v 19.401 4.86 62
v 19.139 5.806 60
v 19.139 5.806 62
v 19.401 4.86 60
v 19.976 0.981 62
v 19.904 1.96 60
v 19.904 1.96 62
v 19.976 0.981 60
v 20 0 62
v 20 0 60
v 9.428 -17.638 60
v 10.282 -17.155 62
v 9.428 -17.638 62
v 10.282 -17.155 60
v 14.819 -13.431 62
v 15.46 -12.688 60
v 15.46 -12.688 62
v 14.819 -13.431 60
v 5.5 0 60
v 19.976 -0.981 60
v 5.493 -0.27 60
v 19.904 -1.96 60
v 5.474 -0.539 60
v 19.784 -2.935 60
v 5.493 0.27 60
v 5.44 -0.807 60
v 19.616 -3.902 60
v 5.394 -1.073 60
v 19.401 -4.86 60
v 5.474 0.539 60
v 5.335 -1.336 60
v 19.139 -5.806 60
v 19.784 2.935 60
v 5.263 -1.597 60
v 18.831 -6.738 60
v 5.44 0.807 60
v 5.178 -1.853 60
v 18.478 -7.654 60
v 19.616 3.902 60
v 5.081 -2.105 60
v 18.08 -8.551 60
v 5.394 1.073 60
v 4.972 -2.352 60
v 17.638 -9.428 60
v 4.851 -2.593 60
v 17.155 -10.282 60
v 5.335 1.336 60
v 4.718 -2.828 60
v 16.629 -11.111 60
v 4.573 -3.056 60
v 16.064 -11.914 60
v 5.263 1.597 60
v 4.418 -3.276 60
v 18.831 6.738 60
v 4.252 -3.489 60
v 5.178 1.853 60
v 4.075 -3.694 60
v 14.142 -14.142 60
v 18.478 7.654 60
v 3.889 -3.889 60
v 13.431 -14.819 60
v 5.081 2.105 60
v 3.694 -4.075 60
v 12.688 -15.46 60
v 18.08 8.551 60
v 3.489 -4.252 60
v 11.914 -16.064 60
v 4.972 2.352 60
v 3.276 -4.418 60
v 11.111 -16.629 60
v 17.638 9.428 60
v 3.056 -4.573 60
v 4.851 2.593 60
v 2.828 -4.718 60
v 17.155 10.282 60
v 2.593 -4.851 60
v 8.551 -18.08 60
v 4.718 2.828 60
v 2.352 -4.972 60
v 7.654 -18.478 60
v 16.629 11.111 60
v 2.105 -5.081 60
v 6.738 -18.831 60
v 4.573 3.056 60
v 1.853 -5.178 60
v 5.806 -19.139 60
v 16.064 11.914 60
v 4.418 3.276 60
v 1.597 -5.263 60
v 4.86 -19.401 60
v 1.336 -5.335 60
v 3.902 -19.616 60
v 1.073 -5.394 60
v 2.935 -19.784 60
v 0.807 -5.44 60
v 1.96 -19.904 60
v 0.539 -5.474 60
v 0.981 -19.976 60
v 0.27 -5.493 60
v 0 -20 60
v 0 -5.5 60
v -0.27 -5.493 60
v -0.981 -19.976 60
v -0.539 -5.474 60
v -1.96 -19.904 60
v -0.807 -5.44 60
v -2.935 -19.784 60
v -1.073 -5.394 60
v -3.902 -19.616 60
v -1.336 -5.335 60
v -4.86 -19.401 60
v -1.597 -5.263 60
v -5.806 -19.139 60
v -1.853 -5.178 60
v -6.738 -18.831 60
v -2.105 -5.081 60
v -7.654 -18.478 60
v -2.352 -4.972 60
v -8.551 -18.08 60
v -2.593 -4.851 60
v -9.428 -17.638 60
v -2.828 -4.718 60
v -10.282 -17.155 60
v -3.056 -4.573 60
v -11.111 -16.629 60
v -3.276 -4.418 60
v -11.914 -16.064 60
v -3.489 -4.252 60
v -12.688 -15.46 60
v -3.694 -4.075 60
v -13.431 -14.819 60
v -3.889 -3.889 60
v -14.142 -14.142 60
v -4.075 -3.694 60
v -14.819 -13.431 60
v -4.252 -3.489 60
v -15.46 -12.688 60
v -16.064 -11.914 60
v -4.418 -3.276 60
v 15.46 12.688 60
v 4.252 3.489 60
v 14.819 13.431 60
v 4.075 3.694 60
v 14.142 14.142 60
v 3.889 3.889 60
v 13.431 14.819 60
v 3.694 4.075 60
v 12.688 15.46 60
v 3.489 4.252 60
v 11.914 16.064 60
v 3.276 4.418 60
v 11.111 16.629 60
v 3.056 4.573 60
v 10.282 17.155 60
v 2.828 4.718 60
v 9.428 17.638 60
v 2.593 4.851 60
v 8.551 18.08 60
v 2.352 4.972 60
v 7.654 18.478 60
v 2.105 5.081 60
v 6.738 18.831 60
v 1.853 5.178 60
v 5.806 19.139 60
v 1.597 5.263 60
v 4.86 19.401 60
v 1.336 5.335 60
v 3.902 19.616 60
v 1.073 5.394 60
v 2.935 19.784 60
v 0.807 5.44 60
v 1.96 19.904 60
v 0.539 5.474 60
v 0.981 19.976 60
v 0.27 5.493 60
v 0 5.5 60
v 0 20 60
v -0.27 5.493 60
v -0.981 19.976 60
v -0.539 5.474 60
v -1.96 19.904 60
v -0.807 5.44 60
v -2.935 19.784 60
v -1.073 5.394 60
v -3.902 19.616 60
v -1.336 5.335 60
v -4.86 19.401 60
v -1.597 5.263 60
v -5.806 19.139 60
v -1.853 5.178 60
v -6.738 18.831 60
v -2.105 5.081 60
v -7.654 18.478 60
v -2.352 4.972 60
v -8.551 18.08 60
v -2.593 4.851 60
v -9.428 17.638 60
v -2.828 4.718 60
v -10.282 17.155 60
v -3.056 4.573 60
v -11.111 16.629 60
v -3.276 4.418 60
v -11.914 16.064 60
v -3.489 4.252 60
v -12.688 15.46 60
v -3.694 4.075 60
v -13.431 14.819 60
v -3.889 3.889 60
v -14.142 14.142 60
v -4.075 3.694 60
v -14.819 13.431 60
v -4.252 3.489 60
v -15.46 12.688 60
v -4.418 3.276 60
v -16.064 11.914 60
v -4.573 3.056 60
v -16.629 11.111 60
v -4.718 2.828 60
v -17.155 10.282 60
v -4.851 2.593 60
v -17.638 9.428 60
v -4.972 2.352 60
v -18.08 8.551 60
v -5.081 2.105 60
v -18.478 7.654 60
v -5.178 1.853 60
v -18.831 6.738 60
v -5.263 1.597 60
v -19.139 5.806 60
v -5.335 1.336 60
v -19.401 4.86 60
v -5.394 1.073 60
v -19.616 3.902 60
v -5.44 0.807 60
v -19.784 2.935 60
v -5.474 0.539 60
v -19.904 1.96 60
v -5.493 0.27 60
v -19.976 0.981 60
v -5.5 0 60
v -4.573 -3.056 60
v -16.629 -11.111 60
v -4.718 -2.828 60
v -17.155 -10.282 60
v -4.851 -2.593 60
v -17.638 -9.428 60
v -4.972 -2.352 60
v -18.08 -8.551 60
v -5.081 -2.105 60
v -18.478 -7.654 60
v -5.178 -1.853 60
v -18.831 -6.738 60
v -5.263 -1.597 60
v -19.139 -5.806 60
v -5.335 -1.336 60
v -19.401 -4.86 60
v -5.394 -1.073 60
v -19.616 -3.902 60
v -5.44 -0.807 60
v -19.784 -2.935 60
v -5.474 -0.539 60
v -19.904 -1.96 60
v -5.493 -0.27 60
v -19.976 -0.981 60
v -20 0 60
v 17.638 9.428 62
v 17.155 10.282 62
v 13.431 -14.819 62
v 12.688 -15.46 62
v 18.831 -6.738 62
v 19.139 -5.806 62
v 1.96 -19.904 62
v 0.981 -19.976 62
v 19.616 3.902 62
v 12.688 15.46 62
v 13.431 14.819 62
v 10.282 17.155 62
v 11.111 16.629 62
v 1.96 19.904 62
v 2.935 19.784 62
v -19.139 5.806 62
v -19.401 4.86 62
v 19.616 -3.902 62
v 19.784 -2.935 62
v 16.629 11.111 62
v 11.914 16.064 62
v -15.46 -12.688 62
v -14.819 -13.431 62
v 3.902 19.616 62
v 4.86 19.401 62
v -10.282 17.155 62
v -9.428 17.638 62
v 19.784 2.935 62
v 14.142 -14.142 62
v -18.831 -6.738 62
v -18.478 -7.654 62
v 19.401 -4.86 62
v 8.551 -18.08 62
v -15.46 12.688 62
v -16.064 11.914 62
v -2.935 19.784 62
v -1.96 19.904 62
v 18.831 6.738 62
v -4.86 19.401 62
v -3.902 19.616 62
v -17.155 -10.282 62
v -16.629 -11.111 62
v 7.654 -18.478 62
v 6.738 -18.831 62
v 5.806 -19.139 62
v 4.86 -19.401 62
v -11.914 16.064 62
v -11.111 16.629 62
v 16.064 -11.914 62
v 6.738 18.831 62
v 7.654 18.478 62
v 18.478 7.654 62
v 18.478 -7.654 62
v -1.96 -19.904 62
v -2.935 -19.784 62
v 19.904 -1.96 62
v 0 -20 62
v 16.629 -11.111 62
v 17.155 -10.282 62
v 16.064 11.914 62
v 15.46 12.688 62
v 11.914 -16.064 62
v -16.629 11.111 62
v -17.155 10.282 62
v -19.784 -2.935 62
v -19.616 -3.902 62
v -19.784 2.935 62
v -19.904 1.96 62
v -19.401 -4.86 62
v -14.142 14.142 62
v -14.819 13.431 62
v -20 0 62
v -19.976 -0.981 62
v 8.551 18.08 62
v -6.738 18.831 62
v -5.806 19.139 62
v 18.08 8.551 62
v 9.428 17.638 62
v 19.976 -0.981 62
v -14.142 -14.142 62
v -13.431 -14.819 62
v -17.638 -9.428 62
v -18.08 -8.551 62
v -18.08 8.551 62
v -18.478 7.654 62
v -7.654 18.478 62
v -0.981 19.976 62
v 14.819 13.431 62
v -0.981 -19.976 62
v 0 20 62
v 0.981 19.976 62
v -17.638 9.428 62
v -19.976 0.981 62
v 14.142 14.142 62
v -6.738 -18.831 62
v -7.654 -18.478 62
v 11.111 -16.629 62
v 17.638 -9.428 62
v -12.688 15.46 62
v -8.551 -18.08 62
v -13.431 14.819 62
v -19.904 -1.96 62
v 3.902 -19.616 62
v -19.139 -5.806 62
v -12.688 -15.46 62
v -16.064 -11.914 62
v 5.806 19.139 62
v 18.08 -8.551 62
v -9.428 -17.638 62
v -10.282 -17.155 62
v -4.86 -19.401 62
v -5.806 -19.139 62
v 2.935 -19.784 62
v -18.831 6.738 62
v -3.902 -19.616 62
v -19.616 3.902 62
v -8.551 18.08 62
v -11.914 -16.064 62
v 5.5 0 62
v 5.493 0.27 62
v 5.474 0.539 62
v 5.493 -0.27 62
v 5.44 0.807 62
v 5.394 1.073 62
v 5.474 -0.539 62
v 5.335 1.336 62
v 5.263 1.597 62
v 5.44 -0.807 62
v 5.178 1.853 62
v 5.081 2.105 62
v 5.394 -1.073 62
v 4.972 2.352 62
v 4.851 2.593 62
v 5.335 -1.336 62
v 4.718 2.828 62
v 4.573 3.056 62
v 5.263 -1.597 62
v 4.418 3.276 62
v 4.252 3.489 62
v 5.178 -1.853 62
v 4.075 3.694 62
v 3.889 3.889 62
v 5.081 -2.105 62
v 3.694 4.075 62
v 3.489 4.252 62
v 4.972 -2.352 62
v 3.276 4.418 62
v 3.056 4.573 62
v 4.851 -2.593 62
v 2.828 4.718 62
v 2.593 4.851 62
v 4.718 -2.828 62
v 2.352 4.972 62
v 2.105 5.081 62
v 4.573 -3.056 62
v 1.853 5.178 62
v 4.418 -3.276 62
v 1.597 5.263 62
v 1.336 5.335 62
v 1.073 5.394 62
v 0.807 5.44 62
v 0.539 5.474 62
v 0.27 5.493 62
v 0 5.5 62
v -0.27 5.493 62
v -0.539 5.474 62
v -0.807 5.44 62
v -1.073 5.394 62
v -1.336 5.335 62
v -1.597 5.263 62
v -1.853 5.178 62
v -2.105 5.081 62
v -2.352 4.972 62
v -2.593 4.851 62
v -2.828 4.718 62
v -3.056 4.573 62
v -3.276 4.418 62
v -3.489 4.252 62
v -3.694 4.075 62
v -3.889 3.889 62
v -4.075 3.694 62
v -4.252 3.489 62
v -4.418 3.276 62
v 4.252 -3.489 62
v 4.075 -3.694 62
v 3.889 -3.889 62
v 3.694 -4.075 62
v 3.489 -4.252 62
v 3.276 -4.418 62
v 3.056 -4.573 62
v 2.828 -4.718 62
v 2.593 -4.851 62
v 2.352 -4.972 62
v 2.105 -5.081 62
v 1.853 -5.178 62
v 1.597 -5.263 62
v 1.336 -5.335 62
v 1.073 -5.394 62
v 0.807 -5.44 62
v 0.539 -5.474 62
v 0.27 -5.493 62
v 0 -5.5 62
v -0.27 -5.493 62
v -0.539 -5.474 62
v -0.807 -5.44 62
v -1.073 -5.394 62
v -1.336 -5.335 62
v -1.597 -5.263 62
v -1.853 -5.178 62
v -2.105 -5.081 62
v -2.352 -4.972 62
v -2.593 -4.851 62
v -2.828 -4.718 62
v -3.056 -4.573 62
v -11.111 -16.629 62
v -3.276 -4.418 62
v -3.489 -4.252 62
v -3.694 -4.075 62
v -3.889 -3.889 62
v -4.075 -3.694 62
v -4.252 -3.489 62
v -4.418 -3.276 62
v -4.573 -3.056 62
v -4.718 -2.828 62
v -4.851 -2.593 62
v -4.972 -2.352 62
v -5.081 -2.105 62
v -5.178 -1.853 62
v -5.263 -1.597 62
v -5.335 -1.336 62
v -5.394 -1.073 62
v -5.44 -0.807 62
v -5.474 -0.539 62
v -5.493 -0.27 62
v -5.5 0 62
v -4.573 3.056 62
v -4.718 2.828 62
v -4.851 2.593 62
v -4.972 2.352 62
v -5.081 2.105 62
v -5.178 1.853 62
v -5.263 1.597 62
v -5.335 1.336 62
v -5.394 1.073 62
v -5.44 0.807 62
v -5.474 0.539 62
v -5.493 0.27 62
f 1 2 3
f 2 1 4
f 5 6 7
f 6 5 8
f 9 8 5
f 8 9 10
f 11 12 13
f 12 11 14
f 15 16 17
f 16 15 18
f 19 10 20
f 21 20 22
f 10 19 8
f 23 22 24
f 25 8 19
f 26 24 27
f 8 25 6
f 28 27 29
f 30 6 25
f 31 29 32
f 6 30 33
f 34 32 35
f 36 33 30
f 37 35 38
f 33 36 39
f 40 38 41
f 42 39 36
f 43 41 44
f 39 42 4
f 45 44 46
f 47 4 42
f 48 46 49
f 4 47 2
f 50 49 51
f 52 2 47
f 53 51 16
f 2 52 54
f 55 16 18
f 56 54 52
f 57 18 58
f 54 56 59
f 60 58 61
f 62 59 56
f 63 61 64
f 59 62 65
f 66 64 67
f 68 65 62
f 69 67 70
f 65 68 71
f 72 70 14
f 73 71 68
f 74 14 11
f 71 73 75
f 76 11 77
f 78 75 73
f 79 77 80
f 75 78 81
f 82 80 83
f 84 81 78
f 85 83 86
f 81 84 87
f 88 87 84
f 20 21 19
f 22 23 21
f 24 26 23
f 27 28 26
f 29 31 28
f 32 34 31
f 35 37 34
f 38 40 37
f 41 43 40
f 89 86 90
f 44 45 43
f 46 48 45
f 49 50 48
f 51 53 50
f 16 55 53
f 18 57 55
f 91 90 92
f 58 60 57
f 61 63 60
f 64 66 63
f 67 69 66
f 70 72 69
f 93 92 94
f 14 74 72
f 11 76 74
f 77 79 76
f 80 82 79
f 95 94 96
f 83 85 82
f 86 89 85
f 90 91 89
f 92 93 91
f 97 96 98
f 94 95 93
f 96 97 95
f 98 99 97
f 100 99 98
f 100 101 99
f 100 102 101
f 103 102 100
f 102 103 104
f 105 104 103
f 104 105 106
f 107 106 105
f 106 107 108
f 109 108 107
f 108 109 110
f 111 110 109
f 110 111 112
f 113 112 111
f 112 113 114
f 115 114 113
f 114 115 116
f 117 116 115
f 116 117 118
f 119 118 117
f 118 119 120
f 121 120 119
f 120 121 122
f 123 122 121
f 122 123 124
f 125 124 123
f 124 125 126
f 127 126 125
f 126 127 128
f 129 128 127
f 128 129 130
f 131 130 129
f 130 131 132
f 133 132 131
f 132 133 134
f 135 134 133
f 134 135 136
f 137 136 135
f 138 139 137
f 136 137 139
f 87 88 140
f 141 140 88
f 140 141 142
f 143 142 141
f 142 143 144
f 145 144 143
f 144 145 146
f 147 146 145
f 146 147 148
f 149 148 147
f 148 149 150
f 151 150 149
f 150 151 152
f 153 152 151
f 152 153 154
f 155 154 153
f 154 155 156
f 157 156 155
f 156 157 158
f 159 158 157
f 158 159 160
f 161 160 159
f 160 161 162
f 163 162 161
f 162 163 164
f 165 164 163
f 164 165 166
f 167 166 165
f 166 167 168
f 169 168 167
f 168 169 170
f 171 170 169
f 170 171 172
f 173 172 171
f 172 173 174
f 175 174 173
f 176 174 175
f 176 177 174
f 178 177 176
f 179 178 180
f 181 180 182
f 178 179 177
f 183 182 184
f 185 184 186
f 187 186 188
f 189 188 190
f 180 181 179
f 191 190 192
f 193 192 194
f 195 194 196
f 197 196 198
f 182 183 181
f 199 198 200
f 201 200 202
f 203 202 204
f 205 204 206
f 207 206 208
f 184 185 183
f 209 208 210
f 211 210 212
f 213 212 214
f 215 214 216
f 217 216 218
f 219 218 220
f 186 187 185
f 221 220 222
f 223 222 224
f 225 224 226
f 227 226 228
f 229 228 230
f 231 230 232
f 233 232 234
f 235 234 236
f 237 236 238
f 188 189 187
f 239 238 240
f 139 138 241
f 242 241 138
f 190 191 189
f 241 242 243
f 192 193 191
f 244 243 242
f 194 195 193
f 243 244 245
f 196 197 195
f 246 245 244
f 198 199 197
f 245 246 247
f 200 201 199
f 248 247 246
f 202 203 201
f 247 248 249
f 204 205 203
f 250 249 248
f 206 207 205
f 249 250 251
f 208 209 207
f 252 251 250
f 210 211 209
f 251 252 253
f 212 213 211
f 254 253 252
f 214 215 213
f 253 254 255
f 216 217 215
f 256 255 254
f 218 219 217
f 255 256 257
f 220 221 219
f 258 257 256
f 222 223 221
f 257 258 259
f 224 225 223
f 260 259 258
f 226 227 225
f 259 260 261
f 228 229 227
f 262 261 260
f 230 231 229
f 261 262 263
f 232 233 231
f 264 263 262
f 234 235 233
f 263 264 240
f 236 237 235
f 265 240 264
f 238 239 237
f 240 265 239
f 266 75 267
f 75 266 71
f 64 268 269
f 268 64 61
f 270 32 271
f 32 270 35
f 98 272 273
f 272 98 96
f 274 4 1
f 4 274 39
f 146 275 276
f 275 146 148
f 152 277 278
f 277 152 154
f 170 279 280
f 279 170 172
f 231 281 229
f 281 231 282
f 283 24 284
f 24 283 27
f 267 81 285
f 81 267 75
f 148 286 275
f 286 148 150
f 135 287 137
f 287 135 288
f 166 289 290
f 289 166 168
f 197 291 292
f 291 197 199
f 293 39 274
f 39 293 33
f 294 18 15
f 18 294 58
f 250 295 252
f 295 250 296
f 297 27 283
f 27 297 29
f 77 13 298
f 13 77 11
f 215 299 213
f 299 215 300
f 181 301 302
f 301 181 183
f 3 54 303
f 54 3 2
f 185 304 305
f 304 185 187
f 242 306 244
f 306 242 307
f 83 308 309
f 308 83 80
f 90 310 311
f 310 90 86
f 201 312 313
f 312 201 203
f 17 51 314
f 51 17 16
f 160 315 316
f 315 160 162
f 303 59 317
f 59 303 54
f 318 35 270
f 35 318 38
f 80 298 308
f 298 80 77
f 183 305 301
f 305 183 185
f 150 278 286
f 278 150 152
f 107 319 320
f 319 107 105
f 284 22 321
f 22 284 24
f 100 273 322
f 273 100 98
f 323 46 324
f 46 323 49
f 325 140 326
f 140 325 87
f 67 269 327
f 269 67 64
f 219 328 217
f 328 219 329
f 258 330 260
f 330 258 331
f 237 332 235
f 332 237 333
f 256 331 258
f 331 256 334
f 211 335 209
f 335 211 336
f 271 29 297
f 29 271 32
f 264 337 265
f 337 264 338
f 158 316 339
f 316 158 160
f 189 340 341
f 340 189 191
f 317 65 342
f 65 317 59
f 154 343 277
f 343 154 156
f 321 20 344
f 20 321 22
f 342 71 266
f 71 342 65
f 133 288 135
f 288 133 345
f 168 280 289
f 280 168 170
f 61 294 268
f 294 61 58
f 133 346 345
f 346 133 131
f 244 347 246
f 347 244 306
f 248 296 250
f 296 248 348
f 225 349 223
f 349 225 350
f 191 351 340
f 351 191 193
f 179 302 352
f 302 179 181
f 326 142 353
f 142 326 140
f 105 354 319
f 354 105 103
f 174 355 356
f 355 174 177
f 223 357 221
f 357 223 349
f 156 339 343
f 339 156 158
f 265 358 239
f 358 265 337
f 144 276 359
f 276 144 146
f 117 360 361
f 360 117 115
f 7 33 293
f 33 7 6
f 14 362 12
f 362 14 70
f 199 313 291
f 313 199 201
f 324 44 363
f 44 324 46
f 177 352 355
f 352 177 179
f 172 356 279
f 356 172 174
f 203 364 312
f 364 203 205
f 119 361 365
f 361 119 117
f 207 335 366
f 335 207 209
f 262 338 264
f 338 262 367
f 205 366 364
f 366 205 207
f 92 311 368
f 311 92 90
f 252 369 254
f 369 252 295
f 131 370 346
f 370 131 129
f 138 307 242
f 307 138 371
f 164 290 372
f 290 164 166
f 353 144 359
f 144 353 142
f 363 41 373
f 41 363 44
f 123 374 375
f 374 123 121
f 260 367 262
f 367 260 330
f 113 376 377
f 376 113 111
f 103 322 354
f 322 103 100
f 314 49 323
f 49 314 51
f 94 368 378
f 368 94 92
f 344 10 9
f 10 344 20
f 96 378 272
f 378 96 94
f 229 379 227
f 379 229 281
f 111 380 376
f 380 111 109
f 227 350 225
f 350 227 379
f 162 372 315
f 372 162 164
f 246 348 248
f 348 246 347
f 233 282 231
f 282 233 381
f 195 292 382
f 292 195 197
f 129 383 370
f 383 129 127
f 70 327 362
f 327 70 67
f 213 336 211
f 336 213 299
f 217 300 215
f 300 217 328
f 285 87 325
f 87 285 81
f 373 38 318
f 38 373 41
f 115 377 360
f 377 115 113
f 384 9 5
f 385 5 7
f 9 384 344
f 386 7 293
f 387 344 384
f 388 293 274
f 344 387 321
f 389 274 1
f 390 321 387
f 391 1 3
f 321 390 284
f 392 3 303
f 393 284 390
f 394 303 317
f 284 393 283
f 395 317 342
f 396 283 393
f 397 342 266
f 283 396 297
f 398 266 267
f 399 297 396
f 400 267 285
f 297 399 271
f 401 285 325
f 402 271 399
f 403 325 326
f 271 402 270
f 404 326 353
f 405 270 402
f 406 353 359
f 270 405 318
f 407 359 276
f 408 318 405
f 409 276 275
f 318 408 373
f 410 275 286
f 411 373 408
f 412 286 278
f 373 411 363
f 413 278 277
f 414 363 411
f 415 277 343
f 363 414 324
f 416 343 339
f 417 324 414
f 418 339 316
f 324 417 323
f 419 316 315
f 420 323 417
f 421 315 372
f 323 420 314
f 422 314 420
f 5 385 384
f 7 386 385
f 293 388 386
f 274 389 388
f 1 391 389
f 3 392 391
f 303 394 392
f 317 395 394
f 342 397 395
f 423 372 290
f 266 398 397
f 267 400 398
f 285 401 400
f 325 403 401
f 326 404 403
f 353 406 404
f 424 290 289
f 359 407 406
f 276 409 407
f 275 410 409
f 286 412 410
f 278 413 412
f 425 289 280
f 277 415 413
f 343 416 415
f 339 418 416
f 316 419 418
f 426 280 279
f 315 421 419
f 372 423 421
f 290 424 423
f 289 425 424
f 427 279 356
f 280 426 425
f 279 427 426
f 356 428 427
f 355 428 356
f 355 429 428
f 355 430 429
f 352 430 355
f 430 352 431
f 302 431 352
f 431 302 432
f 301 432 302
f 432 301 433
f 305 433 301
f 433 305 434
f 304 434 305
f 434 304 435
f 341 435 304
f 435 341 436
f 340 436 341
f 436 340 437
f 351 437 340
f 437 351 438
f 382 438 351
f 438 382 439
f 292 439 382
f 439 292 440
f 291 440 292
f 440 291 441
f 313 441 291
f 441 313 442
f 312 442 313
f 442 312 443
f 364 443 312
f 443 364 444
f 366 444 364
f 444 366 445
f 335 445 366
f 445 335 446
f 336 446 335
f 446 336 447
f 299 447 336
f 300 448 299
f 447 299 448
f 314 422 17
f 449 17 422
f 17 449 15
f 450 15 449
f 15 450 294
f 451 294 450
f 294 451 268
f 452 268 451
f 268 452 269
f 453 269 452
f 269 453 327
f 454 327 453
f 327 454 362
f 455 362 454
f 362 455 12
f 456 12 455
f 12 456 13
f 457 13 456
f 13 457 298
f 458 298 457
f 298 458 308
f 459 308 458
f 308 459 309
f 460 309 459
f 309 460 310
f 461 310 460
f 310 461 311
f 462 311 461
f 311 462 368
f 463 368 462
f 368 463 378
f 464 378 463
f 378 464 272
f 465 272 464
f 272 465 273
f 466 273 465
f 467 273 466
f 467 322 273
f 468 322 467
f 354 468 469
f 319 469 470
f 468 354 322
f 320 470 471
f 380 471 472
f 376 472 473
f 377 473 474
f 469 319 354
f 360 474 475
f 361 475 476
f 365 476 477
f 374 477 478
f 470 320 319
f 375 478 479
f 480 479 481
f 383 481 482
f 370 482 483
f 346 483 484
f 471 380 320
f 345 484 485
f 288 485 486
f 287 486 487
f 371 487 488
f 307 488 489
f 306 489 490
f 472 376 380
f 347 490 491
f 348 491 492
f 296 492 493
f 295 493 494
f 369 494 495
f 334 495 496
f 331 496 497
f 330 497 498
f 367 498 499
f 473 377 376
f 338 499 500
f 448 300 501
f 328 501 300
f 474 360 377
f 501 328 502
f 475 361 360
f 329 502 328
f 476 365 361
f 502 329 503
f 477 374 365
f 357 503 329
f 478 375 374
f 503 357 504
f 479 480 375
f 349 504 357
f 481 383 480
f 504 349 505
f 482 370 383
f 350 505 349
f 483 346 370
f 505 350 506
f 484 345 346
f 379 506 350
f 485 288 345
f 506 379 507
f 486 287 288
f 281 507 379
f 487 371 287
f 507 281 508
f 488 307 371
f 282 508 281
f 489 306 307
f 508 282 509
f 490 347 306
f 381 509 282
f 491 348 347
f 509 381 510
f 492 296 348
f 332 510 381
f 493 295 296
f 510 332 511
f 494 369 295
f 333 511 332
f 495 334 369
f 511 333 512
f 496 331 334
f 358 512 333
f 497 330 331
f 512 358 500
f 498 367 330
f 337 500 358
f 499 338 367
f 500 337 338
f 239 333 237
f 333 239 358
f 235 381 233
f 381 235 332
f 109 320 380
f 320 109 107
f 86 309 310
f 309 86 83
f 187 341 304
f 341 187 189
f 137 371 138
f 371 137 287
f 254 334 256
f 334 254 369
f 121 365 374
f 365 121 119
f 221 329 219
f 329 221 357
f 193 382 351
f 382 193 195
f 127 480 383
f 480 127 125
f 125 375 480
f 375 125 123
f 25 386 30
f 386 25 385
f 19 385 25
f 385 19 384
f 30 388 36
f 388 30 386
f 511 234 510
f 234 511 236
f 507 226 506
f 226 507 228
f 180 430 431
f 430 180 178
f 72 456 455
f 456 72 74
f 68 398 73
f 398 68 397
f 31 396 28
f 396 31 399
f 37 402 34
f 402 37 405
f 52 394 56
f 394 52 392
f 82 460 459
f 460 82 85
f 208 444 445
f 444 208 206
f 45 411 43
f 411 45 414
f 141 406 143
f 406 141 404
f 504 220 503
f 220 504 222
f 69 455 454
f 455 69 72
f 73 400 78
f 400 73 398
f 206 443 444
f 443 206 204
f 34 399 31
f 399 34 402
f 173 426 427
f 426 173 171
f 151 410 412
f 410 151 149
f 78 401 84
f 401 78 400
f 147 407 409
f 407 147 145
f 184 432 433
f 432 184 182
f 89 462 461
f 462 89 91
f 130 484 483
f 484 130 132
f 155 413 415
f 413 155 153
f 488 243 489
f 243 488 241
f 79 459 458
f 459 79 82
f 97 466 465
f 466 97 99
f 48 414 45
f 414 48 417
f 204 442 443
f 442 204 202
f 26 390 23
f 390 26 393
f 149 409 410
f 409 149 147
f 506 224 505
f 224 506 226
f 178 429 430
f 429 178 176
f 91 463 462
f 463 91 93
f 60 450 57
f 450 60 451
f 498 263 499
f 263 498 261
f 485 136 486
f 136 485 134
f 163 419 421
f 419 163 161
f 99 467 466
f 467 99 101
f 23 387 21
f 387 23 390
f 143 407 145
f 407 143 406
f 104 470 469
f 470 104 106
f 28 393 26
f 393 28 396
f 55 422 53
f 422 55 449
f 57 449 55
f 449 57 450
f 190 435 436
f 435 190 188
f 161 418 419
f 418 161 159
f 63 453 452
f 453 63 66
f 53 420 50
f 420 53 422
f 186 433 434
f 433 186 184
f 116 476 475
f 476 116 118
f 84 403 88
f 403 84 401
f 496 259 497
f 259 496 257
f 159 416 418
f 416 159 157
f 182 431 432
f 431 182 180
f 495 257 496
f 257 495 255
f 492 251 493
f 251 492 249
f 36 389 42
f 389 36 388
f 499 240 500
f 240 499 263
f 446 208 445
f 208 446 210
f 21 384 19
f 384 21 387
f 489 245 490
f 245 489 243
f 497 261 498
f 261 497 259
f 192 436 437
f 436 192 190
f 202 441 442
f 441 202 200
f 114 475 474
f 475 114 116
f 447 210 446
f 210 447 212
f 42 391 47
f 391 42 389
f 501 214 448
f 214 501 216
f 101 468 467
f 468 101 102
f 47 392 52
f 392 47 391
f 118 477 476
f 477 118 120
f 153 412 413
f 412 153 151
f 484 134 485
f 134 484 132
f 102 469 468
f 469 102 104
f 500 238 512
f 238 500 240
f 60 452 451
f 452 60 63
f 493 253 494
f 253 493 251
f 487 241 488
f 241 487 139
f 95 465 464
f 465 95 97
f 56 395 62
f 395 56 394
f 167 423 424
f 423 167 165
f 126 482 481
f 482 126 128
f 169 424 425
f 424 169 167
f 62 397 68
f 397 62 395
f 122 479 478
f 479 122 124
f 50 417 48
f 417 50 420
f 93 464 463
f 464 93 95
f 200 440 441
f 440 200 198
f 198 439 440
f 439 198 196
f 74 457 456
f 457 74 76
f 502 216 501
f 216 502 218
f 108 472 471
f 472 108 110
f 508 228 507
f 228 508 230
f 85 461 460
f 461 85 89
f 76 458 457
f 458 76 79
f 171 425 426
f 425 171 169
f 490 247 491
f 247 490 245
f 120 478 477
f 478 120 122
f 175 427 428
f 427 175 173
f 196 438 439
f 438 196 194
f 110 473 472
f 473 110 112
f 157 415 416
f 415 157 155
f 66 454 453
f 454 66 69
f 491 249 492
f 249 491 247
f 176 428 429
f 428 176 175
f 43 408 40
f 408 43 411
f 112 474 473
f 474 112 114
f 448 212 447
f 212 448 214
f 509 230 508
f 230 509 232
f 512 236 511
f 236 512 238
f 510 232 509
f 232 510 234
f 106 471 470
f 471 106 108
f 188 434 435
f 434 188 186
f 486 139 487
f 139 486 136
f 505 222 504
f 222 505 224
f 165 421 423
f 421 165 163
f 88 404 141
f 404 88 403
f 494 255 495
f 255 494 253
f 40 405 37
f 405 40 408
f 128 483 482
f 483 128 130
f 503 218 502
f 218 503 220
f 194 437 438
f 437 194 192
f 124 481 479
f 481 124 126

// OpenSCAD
// file: common_params.scad
cylinder_radius = 20.000000;
cylinder_height = 60.000000;
wall_thickness = 2.000000;

cap_thickness = 2.000000;

rod_radius = 2.000000;
rod_height = 50.000000;

ring_outer_radius = 8.000000;
ring_inner_radius = 4.000000;
ring_thickness = 3.000000;
ring_z = 40.000000;

$fn = 128;
// main file
include <common_params.scad>;

hole_radius = 5.500000;

translate([0, 0, cylinder_height])
difference() {
    cylinder(h = cap_thickness, r = cylinder_radius);
    translate([0, 0, -0.1])
        cylinder(h = cap_thickness + 0.2, r = hole_radius);
}
